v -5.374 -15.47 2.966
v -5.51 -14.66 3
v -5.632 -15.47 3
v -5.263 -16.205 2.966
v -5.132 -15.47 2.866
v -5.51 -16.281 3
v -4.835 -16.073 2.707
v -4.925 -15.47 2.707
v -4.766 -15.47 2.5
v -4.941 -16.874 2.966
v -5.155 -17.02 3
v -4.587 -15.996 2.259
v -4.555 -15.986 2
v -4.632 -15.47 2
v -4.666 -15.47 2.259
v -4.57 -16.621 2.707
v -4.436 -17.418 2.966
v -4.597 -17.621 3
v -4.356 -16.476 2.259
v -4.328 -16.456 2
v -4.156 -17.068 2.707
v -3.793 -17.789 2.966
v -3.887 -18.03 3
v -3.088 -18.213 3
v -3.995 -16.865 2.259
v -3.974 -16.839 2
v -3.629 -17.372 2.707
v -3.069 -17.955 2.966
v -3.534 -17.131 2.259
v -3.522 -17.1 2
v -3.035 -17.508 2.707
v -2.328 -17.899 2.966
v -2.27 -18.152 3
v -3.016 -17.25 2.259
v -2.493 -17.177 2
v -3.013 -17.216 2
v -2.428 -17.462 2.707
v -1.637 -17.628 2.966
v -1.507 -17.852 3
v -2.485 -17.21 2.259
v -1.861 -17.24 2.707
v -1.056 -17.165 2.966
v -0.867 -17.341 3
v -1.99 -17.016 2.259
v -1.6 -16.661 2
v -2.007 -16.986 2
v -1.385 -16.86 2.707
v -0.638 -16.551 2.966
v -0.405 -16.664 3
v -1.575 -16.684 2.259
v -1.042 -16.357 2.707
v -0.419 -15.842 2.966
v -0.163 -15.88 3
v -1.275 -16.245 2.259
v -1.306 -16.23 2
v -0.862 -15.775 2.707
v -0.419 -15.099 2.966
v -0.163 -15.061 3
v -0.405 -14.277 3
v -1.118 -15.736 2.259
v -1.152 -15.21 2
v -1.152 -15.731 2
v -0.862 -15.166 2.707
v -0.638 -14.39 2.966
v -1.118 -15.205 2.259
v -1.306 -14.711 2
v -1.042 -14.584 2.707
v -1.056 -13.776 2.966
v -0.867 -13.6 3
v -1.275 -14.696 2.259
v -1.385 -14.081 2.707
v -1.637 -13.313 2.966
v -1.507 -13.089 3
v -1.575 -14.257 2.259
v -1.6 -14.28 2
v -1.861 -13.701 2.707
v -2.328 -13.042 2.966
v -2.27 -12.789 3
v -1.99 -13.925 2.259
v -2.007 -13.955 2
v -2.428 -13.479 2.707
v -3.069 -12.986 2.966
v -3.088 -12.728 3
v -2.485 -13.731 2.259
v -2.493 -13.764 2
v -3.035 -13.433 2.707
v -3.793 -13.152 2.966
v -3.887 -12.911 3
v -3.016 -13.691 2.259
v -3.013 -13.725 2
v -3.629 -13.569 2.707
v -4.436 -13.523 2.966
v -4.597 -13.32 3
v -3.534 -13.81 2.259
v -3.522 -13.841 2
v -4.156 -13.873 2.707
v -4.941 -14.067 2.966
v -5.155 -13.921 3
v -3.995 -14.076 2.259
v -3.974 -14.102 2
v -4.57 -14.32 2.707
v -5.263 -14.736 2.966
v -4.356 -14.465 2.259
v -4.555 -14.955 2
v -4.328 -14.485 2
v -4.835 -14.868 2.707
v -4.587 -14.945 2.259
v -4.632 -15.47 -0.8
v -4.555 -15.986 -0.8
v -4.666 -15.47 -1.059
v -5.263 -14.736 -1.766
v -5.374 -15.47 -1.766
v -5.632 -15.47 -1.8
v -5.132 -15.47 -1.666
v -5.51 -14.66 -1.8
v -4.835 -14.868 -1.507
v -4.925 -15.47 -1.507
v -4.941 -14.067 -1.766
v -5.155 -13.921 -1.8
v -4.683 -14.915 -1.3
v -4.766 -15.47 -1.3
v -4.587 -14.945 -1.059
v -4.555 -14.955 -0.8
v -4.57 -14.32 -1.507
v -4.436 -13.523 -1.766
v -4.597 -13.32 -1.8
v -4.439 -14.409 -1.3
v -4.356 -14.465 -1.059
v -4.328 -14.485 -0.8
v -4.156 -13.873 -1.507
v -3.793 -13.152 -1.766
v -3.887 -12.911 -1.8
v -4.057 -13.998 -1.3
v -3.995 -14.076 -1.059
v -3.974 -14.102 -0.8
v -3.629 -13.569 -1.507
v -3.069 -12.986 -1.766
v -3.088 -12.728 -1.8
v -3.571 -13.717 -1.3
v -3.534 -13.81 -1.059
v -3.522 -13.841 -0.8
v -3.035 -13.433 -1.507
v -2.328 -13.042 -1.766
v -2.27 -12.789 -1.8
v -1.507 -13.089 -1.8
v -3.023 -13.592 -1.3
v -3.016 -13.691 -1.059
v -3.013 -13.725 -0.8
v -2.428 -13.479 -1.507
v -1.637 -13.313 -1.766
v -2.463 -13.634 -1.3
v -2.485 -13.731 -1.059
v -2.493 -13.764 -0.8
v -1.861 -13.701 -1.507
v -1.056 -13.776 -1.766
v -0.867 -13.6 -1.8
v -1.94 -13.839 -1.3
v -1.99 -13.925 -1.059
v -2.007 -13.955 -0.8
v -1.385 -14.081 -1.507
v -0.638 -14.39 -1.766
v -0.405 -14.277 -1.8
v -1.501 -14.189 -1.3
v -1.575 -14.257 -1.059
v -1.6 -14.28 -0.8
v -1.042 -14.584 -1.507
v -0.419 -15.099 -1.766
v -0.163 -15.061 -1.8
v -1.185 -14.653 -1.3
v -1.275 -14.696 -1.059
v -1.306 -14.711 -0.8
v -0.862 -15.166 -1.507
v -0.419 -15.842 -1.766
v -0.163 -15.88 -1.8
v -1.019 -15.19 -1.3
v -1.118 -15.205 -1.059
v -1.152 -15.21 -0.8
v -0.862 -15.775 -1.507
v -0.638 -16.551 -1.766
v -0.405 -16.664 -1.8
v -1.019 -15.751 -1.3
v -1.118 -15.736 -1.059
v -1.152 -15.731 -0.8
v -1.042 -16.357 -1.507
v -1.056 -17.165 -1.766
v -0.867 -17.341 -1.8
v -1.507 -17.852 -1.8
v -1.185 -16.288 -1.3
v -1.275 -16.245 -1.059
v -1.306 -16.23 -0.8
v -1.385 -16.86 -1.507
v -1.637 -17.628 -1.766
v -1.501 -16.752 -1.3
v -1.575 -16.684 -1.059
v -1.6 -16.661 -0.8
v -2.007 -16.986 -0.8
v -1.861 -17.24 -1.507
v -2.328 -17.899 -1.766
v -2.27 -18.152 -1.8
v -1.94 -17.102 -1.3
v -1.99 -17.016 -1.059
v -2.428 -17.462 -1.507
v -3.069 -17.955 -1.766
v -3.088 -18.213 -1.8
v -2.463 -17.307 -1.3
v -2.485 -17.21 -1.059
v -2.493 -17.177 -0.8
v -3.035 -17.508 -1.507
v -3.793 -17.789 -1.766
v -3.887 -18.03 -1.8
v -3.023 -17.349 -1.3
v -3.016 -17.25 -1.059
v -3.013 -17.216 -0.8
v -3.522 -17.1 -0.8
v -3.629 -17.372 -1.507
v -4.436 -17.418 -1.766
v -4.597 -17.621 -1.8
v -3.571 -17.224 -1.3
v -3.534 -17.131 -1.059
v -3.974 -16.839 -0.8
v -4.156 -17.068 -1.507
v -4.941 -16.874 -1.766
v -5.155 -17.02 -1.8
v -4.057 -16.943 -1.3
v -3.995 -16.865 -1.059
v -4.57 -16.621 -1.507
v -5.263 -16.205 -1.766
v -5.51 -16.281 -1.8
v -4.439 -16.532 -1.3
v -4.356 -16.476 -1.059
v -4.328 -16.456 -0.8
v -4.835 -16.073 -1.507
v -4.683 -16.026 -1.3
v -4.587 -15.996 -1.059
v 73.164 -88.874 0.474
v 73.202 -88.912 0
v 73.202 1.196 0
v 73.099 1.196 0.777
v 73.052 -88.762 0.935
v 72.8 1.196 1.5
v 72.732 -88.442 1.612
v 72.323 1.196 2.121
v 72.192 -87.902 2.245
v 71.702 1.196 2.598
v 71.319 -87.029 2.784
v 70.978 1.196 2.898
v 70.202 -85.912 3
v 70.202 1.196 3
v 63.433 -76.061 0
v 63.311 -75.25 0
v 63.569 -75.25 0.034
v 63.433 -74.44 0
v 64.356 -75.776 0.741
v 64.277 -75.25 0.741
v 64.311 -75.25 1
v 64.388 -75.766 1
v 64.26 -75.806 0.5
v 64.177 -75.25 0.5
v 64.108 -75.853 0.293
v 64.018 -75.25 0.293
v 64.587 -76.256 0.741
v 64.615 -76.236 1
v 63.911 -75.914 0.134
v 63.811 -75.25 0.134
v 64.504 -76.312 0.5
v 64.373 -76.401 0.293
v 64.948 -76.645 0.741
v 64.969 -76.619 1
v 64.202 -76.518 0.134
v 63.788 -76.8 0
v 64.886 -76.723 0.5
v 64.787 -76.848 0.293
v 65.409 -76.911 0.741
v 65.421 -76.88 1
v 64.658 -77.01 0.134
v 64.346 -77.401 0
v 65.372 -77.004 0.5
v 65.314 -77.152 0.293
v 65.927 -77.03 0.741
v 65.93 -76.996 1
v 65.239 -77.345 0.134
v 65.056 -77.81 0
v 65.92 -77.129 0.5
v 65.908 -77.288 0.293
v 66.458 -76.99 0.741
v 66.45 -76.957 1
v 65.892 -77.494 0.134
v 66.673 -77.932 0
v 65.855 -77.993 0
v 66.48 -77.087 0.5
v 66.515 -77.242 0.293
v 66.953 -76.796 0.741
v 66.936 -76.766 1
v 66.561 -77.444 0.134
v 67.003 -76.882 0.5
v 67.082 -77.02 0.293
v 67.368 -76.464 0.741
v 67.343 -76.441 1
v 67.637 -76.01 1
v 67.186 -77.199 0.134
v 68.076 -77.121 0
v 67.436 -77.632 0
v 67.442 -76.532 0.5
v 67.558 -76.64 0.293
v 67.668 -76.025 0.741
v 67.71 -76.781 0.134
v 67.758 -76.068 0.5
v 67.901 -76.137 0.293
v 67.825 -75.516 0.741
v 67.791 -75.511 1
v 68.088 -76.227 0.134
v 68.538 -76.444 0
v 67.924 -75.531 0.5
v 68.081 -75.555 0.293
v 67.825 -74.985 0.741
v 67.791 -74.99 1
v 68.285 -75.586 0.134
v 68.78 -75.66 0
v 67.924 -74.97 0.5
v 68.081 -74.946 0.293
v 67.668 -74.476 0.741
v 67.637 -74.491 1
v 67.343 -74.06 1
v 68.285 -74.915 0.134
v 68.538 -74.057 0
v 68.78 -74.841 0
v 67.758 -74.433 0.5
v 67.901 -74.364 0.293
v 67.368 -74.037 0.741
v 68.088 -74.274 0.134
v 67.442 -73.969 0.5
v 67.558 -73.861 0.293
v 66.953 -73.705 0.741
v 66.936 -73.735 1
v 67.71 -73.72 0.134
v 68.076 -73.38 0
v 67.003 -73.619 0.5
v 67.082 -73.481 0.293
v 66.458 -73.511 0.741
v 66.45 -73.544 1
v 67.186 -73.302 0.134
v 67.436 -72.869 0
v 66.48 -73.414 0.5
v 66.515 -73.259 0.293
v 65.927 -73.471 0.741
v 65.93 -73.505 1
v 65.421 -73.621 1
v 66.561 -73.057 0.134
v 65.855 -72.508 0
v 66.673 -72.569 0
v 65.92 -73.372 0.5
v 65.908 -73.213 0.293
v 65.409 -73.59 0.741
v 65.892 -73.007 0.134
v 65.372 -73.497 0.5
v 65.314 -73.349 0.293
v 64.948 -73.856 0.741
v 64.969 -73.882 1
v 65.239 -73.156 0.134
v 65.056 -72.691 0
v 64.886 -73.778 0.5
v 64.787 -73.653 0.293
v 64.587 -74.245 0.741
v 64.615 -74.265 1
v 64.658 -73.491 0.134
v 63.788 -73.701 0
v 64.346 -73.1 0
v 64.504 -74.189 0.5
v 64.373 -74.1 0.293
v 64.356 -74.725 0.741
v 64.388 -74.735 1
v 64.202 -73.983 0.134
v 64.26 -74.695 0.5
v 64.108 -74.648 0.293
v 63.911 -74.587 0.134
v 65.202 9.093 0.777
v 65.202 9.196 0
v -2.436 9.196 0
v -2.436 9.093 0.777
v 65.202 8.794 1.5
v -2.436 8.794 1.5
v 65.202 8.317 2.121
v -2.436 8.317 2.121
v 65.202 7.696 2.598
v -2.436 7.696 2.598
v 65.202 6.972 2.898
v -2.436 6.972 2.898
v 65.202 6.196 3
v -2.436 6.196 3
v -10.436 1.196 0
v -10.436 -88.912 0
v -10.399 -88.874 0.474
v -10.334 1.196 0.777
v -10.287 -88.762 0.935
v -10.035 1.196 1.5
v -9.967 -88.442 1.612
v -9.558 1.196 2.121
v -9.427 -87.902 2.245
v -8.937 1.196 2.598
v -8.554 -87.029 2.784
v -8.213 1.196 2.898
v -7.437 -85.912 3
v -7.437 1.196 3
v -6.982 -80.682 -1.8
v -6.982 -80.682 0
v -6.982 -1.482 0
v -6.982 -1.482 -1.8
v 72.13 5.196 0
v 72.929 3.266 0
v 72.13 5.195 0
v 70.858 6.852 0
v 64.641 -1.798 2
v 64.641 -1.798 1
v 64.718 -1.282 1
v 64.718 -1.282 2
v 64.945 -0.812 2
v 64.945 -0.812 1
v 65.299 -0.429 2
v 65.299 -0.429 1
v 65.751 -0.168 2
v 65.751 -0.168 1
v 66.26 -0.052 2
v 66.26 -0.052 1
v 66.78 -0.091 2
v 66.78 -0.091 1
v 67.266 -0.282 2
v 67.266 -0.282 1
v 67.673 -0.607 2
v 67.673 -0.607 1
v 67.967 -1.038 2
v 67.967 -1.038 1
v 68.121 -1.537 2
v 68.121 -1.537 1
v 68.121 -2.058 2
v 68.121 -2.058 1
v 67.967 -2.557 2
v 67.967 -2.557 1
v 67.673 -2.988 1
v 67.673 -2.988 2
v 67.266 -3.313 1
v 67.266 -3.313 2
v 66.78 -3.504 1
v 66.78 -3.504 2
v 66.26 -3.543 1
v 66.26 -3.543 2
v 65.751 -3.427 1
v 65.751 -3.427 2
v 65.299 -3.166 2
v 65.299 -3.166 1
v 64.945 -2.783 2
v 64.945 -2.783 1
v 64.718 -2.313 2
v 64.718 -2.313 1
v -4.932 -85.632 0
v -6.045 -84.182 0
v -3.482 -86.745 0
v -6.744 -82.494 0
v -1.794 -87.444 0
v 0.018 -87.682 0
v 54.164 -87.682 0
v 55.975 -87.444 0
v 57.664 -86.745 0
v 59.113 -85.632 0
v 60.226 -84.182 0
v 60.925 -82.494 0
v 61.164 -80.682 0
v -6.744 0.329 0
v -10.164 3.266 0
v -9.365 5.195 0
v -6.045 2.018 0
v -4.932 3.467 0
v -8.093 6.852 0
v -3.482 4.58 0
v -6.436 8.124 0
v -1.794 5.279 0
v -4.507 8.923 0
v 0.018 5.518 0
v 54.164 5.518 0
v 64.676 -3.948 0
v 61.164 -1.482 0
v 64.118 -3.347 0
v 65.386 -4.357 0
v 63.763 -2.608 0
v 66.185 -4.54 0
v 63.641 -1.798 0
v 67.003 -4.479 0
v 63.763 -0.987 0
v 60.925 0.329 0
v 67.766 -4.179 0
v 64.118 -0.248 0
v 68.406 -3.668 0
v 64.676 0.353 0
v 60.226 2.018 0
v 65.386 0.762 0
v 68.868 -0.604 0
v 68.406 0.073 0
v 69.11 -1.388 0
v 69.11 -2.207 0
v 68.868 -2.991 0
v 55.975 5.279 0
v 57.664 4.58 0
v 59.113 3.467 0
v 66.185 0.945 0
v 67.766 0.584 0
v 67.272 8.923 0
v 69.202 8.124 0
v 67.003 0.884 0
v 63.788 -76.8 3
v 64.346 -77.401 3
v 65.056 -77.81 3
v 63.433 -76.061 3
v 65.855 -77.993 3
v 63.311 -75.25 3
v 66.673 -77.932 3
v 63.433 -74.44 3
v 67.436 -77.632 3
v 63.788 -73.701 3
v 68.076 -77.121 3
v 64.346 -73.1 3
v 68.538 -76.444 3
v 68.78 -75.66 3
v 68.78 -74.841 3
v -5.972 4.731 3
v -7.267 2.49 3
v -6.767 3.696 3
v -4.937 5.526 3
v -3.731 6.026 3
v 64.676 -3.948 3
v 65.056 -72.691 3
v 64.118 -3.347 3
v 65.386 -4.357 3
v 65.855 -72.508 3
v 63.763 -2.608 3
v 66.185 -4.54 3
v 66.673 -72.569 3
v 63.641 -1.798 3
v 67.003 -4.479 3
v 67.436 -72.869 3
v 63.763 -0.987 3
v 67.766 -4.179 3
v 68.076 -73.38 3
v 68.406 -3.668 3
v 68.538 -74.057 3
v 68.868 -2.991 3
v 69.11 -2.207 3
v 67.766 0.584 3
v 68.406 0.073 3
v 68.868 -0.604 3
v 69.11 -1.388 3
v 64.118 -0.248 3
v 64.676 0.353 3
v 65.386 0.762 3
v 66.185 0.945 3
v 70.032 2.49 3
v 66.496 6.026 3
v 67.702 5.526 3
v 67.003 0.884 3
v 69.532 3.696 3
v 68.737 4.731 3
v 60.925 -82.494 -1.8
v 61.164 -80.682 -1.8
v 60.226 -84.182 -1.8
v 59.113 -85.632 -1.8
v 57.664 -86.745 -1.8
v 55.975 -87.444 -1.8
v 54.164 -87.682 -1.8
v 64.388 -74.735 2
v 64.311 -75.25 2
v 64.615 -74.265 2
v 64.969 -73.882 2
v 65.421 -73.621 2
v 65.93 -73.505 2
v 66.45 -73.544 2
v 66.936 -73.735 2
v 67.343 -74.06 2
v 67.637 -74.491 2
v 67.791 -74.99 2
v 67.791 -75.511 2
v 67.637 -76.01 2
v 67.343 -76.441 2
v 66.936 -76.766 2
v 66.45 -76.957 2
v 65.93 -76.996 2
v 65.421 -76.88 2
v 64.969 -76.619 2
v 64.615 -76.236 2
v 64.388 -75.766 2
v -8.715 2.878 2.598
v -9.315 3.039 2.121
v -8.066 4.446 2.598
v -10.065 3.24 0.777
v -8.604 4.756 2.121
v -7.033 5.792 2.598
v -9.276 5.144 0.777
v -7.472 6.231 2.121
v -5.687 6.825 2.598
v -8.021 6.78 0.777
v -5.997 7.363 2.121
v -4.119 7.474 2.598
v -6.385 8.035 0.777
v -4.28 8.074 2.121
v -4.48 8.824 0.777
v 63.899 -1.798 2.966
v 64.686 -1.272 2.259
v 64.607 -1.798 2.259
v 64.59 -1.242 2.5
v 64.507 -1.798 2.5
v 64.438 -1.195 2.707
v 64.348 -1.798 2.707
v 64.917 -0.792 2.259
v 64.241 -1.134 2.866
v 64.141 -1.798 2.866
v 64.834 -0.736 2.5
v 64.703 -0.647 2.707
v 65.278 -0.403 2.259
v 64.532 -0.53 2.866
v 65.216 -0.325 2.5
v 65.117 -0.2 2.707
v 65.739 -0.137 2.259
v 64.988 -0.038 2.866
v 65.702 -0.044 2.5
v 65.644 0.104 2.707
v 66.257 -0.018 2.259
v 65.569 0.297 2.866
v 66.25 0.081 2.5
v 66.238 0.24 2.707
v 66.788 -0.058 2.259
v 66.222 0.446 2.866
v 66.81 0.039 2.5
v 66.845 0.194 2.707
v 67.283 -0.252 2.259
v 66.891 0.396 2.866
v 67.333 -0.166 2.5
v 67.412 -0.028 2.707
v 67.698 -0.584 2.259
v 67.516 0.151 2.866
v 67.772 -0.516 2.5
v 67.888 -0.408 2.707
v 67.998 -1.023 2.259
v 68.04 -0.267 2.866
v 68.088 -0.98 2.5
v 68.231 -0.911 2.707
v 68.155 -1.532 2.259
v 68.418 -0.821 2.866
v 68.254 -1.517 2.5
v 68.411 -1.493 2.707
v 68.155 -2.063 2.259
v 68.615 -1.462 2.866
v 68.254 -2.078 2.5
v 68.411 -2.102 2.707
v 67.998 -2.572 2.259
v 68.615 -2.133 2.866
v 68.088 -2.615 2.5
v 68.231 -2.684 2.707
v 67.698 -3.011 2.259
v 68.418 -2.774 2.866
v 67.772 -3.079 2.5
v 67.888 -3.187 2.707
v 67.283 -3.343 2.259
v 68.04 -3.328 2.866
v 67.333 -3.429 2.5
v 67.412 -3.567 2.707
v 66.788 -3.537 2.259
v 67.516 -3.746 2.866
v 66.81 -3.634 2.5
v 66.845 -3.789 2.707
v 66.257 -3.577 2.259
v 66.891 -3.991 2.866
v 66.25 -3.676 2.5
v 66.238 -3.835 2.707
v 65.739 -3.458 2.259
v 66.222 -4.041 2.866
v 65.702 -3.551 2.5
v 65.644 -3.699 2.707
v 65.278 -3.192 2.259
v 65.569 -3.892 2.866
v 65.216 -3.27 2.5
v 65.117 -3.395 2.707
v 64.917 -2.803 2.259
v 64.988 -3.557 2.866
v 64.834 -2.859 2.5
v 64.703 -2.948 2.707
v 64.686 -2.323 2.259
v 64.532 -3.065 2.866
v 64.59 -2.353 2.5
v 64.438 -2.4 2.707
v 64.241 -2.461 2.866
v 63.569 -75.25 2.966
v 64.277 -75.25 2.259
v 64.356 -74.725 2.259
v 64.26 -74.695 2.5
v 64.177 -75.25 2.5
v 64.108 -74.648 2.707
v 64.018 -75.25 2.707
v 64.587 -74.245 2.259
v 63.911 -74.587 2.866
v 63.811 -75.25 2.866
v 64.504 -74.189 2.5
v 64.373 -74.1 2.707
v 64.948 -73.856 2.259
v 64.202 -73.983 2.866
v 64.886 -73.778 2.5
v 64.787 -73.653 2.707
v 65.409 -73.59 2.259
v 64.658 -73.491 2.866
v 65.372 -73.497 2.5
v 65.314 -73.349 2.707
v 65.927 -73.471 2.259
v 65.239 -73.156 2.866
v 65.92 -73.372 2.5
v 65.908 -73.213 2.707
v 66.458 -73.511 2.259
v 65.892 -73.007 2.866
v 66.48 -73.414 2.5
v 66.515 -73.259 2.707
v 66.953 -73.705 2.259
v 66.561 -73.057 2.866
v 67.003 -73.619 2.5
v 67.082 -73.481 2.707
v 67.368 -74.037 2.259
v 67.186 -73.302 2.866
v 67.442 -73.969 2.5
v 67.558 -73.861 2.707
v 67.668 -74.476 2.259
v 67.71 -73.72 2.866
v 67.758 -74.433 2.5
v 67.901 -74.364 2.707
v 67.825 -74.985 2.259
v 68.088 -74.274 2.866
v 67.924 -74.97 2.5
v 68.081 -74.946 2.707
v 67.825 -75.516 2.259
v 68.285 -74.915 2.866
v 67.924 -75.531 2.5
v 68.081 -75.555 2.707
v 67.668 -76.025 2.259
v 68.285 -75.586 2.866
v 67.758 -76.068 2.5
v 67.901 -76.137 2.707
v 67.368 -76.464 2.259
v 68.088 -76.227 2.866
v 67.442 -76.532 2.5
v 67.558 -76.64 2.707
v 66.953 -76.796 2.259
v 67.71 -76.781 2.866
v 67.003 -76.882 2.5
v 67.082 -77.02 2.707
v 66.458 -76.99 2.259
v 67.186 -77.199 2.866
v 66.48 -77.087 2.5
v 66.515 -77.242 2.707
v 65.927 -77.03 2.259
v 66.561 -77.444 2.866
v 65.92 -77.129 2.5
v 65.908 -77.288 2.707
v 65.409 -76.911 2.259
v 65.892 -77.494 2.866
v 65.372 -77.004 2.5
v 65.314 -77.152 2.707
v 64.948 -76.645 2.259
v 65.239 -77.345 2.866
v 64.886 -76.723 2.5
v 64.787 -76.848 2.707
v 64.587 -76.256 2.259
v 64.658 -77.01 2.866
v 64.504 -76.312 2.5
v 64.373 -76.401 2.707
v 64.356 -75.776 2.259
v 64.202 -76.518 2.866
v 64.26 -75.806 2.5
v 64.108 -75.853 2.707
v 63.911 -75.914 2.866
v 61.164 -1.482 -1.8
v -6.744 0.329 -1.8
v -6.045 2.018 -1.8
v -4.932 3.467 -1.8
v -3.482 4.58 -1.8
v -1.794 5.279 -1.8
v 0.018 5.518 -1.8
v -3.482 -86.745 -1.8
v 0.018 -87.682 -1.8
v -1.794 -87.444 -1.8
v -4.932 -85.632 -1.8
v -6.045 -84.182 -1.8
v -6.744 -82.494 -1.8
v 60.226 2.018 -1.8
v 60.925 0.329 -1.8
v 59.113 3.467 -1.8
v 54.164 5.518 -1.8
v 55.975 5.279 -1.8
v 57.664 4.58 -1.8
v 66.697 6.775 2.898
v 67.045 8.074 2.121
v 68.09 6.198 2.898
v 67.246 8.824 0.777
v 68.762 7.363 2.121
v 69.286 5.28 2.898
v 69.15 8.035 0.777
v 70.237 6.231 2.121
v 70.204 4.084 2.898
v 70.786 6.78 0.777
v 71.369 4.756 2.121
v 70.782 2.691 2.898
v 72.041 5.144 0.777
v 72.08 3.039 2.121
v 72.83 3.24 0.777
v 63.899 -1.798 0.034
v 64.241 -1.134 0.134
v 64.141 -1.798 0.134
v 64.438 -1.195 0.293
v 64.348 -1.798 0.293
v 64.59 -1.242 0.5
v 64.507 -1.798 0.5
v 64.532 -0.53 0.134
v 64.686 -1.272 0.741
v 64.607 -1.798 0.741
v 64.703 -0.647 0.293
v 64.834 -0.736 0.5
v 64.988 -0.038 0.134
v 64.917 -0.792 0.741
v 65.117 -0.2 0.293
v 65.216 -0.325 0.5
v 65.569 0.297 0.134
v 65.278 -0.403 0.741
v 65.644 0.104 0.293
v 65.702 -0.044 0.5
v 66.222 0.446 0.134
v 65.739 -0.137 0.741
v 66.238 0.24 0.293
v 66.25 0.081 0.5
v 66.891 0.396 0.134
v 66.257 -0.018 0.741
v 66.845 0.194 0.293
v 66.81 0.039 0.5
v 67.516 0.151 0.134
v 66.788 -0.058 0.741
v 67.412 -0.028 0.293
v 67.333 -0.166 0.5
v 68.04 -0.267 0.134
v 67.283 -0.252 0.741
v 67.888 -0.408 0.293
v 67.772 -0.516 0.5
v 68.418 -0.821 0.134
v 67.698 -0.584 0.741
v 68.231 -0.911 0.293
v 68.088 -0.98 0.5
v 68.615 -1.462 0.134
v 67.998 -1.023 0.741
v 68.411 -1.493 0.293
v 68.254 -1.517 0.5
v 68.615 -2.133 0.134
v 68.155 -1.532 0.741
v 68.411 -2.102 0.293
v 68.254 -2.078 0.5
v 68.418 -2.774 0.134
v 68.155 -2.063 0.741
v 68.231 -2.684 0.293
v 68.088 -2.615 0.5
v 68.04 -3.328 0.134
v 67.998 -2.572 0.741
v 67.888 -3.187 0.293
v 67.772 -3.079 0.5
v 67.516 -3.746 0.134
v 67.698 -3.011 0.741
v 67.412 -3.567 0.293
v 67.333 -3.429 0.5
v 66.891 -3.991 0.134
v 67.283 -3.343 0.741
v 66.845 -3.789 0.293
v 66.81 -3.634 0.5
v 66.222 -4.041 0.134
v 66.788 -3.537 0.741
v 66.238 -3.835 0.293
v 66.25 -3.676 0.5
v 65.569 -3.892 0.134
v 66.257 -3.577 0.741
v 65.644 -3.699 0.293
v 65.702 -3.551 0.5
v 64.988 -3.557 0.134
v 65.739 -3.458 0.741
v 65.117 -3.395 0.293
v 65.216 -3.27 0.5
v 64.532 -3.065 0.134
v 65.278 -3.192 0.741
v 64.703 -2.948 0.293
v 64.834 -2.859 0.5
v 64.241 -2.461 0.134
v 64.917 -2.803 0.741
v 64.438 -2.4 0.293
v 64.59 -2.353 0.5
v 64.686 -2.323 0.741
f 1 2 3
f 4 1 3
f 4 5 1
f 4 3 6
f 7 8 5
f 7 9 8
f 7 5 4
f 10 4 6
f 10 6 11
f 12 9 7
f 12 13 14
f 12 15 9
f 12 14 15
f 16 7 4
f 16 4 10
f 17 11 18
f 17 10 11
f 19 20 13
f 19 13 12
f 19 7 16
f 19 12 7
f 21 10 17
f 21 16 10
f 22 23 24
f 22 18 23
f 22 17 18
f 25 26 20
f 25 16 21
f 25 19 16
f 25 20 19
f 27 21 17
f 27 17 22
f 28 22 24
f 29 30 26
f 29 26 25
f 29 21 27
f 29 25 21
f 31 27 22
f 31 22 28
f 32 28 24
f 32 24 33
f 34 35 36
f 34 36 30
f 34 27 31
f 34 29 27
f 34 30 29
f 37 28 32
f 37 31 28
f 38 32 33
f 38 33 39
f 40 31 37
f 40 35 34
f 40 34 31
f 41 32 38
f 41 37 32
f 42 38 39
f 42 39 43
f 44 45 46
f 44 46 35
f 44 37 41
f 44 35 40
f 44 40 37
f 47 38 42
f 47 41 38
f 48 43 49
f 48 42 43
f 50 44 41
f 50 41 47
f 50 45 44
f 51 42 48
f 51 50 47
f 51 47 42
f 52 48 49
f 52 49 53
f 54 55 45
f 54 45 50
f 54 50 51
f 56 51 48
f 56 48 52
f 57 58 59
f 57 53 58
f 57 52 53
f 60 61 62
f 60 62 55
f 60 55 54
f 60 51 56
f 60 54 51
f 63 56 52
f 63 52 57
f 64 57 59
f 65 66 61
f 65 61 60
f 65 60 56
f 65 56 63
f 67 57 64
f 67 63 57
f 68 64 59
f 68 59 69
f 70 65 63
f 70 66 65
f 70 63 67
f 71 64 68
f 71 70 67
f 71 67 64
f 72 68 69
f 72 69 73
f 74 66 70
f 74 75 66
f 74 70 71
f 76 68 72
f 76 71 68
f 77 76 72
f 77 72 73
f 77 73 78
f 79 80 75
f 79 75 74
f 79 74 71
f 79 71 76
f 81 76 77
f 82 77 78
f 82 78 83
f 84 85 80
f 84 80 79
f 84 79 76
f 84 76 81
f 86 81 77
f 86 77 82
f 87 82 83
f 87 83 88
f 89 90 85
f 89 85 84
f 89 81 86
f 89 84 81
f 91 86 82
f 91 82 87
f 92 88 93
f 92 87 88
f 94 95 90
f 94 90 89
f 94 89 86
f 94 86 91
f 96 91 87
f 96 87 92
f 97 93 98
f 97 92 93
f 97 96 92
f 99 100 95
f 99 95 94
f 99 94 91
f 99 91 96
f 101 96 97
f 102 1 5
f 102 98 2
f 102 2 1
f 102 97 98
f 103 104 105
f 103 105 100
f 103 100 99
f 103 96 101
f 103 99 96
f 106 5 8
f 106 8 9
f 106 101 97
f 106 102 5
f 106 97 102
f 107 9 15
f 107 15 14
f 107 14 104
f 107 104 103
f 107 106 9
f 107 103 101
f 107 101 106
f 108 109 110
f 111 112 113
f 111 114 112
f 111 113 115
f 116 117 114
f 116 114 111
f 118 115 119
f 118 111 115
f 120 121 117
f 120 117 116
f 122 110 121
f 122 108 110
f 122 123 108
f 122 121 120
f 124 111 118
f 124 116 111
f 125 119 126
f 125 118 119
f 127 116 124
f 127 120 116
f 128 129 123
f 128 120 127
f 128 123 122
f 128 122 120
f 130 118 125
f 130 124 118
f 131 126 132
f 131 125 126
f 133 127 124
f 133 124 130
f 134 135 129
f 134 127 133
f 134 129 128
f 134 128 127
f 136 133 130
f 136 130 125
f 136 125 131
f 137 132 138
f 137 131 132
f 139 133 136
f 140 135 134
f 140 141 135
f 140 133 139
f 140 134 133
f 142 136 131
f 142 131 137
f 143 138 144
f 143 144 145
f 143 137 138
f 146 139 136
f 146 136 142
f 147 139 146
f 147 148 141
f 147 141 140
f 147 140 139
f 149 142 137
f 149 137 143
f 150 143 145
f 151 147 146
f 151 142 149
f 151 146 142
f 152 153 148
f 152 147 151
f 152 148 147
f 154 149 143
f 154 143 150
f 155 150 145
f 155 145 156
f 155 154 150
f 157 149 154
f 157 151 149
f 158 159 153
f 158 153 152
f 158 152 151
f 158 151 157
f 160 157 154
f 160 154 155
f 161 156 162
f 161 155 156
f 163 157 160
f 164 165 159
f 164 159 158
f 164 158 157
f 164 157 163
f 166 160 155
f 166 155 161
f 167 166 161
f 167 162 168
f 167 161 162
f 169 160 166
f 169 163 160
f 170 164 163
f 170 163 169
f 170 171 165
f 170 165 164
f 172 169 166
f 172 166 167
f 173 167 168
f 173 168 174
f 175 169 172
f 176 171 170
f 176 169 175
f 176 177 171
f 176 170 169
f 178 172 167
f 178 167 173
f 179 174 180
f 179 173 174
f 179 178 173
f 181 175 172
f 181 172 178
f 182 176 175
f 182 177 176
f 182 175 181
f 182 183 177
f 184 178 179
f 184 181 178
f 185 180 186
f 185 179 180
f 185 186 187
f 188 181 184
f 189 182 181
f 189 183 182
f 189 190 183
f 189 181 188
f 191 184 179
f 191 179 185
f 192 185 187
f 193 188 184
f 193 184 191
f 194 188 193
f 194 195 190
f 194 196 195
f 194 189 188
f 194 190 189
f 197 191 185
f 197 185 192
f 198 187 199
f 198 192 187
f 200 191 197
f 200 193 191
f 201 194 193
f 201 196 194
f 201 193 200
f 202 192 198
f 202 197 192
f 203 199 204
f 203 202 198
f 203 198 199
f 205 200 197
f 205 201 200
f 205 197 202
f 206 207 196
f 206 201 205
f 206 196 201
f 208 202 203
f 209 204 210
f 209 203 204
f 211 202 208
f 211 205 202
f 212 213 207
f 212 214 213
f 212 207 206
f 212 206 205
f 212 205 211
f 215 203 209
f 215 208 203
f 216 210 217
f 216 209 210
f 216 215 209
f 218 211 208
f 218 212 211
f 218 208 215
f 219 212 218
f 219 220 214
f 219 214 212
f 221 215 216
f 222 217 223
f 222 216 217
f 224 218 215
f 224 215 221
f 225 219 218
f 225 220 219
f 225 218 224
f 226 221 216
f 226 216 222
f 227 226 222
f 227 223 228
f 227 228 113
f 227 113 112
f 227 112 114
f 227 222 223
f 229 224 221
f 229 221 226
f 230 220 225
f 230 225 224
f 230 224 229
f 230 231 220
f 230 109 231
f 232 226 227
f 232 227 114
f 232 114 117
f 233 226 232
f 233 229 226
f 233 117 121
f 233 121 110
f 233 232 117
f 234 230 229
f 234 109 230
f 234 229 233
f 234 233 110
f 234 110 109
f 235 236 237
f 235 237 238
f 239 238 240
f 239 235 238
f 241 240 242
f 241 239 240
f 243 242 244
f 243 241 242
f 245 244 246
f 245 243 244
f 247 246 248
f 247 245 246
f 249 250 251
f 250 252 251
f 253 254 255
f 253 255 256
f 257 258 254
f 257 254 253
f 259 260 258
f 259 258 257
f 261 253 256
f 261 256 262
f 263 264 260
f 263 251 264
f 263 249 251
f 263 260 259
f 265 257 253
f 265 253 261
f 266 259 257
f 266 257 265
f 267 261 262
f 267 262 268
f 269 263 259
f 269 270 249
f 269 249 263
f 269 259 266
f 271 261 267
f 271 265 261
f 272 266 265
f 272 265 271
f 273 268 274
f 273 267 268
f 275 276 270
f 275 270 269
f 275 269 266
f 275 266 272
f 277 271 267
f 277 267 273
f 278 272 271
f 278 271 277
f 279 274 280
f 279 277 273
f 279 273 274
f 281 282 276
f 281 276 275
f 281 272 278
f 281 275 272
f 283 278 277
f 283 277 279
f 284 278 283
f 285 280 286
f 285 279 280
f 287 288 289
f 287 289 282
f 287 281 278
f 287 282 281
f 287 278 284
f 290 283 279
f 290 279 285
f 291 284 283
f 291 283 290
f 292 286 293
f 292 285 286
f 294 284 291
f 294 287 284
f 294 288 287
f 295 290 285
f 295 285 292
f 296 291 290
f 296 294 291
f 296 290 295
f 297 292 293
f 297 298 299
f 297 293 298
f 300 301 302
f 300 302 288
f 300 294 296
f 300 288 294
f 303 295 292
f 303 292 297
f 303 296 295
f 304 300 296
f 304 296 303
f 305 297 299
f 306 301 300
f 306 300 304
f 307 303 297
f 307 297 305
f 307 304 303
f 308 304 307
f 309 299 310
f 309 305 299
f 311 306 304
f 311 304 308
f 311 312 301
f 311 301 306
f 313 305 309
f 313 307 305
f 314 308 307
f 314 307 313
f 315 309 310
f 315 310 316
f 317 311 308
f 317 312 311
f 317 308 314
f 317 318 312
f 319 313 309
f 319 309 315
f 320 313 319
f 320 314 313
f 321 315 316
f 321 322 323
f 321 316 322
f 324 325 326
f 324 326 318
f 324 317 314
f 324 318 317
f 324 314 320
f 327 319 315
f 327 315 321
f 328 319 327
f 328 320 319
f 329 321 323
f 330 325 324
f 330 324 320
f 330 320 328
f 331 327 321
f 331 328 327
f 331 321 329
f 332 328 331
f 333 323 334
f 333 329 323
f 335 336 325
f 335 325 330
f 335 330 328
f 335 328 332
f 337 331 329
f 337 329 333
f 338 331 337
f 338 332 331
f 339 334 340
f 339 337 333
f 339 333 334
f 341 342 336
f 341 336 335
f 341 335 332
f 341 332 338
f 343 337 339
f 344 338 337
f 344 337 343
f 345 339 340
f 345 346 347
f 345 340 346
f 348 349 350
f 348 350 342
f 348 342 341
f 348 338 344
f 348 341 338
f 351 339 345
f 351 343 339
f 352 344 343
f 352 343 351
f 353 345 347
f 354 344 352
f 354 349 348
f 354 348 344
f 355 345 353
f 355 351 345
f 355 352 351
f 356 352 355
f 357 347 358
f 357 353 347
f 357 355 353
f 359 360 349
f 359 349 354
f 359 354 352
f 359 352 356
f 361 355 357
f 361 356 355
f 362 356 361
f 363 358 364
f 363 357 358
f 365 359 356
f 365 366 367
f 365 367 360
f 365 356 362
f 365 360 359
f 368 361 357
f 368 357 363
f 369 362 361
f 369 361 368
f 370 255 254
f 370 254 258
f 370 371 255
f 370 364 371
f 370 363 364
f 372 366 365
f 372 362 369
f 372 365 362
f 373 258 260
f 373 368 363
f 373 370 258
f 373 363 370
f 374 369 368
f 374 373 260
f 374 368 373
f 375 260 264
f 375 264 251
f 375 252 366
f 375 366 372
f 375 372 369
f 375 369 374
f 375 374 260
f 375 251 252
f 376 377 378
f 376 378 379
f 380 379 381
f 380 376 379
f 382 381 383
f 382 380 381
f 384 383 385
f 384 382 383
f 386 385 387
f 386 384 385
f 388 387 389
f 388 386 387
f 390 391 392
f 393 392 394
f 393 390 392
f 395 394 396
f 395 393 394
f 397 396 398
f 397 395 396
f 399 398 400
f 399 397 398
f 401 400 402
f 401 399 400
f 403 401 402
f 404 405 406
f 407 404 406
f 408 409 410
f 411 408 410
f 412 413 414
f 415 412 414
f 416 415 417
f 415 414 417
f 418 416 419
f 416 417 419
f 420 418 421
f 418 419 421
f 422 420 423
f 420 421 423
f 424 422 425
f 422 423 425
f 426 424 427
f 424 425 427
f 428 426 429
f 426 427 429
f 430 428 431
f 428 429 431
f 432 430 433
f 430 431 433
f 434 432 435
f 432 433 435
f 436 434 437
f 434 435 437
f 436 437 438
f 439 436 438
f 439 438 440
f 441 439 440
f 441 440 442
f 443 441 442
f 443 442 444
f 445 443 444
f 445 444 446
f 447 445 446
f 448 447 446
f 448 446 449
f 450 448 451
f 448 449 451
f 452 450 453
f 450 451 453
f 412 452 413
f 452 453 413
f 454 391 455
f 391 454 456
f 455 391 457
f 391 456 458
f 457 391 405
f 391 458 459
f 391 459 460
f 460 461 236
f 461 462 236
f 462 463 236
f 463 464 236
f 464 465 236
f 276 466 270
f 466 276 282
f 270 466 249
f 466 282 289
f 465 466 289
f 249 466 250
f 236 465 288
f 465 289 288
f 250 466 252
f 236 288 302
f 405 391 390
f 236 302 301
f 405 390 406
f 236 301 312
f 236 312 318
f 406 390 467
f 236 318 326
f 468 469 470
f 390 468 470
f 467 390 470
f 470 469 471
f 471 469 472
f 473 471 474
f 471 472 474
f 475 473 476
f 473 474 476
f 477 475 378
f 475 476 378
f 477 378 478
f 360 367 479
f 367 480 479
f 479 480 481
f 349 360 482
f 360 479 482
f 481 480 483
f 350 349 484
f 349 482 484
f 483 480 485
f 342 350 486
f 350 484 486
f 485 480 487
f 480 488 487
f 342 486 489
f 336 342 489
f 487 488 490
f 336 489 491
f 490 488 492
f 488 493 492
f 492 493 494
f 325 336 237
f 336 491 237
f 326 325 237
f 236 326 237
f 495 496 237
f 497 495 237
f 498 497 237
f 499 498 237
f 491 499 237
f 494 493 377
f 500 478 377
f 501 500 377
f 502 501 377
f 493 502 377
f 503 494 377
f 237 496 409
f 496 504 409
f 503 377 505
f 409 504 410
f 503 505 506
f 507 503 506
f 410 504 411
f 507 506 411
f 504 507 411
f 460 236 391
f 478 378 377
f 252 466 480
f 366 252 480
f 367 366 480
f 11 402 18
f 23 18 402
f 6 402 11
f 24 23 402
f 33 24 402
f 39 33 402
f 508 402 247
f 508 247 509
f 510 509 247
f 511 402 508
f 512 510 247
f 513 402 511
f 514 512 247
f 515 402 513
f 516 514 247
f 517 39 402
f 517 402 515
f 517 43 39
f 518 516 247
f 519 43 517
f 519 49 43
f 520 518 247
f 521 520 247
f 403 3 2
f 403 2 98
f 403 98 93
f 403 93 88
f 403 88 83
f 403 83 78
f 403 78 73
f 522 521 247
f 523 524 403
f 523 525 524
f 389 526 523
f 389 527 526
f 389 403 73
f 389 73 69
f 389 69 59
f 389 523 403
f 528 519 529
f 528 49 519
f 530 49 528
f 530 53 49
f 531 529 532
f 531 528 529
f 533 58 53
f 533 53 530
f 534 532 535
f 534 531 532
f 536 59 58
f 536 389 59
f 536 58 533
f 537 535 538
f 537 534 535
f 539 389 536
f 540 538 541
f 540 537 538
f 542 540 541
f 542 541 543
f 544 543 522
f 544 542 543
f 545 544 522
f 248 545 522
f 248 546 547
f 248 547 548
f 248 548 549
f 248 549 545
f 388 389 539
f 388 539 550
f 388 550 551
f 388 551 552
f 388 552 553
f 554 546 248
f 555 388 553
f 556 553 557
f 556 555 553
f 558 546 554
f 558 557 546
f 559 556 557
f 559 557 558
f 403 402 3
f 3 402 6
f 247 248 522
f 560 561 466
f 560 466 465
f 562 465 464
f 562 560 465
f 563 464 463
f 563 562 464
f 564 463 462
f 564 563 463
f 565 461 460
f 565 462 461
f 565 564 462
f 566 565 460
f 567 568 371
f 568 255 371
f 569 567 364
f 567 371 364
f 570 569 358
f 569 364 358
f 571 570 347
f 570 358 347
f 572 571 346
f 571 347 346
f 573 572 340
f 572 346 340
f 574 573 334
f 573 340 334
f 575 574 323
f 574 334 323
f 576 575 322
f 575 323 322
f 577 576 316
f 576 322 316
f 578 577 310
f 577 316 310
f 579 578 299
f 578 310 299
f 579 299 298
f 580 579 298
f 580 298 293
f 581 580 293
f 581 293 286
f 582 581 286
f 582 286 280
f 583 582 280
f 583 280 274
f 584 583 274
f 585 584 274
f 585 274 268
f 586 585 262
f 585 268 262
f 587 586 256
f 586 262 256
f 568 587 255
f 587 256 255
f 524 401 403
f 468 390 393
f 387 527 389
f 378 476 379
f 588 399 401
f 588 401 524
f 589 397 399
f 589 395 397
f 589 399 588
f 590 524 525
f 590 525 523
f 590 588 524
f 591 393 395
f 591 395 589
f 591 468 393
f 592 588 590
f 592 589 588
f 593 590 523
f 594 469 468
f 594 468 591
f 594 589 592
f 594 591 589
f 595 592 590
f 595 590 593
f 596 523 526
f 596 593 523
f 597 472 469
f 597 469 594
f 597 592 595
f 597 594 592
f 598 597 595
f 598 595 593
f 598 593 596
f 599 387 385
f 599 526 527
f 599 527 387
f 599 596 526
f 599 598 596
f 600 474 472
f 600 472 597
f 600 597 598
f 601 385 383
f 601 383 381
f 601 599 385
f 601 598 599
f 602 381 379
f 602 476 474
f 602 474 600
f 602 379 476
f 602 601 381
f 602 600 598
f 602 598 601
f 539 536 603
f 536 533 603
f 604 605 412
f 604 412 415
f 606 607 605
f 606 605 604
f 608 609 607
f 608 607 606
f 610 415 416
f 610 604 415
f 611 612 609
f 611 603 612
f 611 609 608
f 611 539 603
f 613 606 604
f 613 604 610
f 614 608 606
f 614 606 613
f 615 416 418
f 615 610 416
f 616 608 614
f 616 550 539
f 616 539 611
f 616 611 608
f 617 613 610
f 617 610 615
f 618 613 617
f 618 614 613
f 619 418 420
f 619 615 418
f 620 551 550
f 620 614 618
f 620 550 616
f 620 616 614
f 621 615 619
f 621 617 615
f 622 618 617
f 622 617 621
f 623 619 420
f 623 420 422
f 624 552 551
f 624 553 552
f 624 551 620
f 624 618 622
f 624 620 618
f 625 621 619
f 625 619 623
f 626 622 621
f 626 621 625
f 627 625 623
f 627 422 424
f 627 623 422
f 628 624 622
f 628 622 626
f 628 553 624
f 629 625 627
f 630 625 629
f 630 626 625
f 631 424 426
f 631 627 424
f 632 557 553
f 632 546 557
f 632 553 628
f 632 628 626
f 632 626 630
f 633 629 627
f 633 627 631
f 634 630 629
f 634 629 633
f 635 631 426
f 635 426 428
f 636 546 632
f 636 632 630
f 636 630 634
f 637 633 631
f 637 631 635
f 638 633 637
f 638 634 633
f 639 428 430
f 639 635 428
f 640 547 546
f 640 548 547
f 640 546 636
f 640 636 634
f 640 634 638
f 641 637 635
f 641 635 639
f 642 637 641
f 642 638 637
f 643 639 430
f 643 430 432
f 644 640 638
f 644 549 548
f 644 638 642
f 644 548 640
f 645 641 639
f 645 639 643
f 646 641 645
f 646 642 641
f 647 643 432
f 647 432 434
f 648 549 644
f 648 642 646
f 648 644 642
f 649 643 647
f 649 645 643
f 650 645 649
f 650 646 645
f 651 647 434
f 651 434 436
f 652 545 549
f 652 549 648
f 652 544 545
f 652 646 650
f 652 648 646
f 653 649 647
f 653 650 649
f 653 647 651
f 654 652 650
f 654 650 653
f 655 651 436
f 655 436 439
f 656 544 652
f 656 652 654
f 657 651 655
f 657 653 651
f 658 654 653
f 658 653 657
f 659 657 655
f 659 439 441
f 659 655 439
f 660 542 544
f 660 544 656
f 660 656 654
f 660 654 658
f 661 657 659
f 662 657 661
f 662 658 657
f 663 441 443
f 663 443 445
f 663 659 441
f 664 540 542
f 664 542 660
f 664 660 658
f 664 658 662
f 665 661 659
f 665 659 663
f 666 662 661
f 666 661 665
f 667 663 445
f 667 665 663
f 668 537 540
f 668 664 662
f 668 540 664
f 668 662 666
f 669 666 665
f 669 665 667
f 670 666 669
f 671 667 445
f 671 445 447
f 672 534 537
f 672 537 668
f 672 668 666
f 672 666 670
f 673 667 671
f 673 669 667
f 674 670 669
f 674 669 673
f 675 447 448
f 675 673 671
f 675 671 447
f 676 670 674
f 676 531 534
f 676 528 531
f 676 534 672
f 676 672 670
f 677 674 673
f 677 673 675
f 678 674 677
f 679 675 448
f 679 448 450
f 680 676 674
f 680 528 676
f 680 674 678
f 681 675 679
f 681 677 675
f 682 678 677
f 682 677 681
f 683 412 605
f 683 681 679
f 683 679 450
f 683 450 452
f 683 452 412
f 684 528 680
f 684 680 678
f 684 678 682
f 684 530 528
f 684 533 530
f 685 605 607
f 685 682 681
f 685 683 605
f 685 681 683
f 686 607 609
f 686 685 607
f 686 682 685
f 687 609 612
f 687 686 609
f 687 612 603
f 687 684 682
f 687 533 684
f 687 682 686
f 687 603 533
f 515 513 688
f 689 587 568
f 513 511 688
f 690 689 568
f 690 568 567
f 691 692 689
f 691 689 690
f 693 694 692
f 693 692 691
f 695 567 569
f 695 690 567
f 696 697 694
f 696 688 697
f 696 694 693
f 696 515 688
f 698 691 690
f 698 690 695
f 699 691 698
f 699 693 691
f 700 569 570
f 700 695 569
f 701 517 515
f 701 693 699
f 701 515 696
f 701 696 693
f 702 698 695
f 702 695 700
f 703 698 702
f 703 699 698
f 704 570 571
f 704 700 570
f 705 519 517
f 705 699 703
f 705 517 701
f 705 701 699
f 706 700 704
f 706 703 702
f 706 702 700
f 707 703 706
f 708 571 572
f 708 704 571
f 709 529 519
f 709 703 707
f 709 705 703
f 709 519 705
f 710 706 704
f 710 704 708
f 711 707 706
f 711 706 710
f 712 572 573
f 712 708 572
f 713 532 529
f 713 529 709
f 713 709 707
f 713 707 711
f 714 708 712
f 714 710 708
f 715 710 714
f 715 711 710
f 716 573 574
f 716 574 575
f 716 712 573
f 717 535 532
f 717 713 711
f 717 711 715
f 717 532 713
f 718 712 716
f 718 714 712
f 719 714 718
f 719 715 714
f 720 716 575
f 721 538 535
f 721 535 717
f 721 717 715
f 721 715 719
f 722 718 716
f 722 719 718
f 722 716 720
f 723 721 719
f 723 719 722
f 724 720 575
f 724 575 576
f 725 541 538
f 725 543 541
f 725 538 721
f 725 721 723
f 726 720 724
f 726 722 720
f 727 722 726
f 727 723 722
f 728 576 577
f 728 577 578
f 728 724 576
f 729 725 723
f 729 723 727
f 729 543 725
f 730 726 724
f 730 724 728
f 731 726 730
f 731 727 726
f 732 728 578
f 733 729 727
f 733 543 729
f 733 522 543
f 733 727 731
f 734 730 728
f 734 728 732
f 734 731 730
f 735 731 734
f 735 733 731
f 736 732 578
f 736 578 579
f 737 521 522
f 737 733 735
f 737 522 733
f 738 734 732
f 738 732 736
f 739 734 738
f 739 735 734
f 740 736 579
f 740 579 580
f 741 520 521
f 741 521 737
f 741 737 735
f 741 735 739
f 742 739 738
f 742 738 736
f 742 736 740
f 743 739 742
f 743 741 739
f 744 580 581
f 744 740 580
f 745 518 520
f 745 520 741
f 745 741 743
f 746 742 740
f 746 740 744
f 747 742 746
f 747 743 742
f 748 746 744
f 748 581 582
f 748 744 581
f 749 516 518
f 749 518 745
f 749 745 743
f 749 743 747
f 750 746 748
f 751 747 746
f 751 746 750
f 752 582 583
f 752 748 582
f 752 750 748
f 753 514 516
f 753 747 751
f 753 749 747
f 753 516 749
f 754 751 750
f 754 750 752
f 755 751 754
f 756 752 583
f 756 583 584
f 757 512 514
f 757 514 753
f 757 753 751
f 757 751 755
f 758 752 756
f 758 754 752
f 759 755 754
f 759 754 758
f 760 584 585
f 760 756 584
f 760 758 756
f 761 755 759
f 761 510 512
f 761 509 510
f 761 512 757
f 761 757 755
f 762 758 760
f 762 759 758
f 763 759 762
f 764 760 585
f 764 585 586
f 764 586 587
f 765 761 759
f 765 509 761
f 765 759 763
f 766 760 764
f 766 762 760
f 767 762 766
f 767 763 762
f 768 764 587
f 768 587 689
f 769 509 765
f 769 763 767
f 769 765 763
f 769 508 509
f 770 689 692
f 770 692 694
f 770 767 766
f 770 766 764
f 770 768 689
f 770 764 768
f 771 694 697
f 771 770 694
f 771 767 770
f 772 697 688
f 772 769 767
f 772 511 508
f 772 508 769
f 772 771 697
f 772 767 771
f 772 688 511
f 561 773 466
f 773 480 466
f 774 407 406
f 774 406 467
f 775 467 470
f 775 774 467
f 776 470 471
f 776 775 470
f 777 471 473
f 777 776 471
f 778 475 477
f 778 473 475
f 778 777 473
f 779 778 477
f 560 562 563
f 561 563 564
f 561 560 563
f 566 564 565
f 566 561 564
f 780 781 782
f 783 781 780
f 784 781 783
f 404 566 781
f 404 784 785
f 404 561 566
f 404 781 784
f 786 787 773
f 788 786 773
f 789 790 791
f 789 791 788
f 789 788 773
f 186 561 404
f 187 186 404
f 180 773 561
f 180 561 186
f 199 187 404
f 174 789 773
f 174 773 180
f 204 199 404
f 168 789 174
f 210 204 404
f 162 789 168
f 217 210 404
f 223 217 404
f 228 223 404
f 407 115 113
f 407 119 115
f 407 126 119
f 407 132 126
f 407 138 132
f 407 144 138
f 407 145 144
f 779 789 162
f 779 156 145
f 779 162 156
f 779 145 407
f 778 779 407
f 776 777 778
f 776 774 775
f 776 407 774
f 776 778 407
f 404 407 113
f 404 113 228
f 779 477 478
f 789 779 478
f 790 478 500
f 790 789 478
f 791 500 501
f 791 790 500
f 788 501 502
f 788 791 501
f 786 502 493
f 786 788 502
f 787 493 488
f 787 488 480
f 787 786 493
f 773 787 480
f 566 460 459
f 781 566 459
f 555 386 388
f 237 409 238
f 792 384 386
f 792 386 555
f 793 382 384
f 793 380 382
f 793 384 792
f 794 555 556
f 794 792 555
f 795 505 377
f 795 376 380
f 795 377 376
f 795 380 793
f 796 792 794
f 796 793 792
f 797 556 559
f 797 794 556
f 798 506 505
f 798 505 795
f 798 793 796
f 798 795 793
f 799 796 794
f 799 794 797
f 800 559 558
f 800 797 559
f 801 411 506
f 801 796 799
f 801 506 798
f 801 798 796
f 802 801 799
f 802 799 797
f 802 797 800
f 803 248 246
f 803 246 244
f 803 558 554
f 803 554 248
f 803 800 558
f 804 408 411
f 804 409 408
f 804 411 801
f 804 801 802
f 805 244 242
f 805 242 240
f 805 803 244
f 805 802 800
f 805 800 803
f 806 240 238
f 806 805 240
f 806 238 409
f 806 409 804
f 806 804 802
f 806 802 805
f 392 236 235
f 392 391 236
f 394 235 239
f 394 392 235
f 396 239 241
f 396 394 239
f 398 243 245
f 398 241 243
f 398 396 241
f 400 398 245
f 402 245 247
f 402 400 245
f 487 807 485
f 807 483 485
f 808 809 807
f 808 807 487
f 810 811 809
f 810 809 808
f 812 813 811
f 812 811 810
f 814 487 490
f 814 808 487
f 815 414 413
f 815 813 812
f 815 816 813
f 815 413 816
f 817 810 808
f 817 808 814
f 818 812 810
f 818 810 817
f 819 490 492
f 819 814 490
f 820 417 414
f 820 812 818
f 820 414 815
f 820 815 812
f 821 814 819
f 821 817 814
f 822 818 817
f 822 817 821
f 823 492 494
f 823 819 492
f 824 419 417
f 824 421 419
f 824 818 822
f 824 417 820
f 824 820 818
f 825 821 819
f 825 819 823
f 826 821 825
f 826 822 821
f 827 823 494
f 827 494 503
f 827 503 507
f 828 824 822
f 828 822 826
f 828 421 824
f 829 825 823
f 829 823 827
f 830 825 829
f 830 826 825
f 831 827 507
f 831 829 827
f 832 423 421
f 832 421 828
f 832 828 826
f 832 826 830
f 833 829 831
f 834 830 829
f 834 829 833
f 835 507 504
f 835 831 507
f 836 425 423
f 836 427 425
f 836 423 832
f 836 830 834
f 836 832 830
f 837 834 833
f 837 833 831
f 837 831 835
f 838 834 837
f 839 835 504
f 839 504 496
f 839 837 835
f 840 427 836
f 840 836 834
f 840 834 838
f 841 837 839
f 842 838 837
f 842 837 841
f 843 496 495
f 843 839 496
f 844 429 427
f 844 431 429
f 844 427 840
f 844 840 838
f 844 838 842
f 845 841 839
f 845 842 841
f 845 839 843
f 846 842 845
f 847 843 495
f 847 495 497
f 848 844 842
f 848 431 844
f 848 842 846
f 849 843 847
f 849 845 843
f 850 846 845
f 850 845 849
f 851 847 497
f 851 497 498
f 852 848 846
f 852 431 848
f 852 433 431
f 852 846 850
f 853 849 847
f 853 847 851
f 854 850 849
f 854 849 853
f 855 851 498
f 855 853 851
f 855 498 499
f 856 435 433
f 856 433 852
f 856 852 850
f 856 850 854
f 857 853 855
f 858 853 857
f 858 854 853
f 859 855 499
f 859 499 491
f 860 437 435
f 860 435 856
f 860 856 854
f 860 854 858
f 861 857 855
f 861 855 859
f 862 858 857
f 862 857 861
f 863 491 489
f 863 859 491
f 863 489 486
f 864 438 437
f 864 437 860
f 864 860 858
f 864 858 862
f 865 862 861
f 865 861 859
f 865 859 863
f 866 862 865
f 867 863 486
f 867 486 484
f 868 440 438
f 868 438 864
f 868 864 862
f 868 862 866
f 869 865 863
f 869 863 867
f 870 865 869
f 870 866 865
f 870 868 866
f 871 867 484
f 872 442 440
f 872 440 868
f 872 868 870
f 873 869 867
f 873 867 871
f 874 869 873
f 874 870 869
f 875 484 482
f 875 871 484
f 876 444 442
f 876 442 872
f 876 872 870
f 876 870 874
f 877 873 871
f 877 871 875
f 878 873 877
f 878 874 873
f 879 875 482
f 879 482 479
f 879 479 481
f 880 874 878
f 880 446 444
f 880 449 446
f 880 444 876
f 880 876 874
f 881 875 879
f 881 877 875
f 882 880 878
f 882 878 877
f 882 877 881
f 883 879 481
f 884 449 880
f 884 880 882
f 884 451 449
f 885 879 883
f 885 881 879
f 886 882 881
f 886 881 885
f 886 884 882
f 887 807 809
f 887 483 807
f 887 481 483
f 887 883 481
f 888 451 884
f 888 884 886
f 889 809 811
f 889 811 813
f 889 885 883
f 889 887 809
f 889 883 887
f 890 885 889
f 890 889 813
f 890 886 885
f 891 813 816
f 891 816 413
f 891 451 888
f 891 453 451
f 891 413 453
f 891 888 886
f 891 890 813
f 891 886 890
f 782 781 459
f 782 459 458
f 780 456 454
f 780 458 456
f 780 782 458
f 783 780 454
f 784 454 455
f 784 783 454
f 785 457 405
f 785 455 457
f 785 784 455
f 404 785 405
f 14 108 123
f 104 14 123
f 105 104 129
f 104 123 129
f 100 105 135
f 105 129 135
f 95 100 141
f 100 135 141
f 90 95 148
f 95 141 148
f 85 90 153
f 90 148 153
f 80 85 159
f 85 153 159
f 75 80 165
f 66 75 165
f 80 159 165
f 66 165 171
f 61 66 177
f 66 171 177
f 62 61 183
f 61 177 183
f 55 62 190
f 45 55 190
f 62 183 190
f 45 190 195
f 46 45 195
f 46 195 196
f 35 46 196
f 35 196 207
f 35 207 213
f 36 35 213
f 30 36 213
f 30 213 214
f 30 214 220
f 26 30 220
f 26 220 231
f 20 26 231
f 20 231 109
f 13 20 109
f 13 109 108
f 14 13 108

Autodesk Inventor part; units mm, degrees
ref_plane "YZ Plane" through (0, 0, 0) normal (1, 0, 0) x (0, 1, 0)
ref_plane "XZ Plane" through (0, 0, 0) normal (0, 1, 0) x (-1, 0, 0)
ref_plane "XY Plane" through (0, 0, 0) normal (0, 0, 1) x (1, 0, 0)
sketch "Esboço1" plane through (0, 0, 0) normal (0, 0, 1) x (1, 0, 0)
  line L0 (-10.4364, 9.1955) -> (73.2016, 9.1955)
  line L1 (73.2016, 9.1955) -> (73.2016, -88.9115)
  line L2 (73.2016, -88.9115) -> (-10.4364, -88.9115)
  line L3 (-10.4364, -88.9115) -> (-10.4364, 9.1955)
  point P0 (0, 0)
  dimension "d0" = 83.638
  dimension "d1" = 98.107
extrude "Extrusão1" add sketch "Esboço1" along normal blind 3
fillet "Arredondamento1" radius 8 2 edges at (73.2016, 9.1955, 1.5) (-10.4364, 9.1955, 1.5)
sketch "Esboço2" plane through (0, 0, 0) normal (0, 0, -1) x (-1, 0, 0)
  line L0 (-61.1636, -87.6825) -> (6.9824, -87.6825)
  line L1 (6.9824, -87.6825) -> (6.9824, 5.5175)
  line L2 (6.9824, 5.5175) -> (-61.1636, 5.5175)
  line L3 (-61.1636, 5.5175) -> (-61.1636, -87.6825)
  line L4 (2.4364, 9.1955) -> (-65.2016, 9.1955) projected
  line L5 (10.4364, -88.9115) -> (10.4364, 1.1955) projected
  line L6 (-73.2016, -88.9115) -> (10.4364, -88.9115) projected
  point P0 (0, 0)
  dimension "d11" = 68.146
  dimension "d12" = 93.2
  dimension "d14" = 3.454
  dimension "d18" = 1.229
extrude "Extrusão2" add sketch "Esboço2" along normal blind 1.8
fillet "Arredondamento2" radius 7 4 edges at (-6.9824, 5.5175, -0.9) (61.1636, 5.5175, -0.9) (-6.9824, -87.6825, -0.9) (61.1636, -87.6825, -0.9)
sketch "Esboço3" plane through (0, 0, 0) normal (0, 0, -1) x (-1, 0, 0)
  circle A0 centre (-66.3906, -1.7975) radius 1.75
  circle A1 centre (-66.0606, -75.2505) radius 1.75
  circle A2 centre (2.8824, -15.4705) radius 1.75
  line L0 (2.4364, 9.1955) -> (-65.2016, 9.1955) projected
  line L1 (10.4364, -88.9115) -> (10.4364, 1.1955) projected
  line L2 (-73.2016, 1.1955) -> (-73.2016, -88.9115) projected
  line L3 (-73.2016, -88.9115) -> (10.4364, -88.9115) projected
  point P0 (0, 0)
  dimension "d19" = 3.5
  dimension "d20" = 3.5
  dimension "d21" = 3.5
  dimension "d22" = 24.666
  dimension "d23" = 7.554
  dimension "d24" = 6.811
  dimension "d25" = 10.993
  dimension "d26" = 13.661
  dimension "d27" = 7.141
extrude "Extrusão3" cut sketch "Esboço3" against normal blind 4 and the other way blind 4
fillet "Arredondamento3" radius 1 3 edges at (68.1406, -1.7975, 3) (67.8106, -75.2505, 3) (-1.1324, -15.4705, 3)
fillet "Arredondamento4" radius 1 3 edges at (-1.1324, -15.4705, -1.8) (68.1406, -1.7975, 0) (67.8106, -75.2505, 0)
fillet "Arredondamento5" radius 3 6 edges at (-10.4364, -43.858, 3) (-8.0933, 6.8523, 3) (31.3826, 9.1955, 3) (70.8584, 6.8523, 3) (73.2016, -43.858, 3) (31.3826, -88.9115, 3)
properties part number "Tampa frente Cartucho MS - 11-05-2016"
